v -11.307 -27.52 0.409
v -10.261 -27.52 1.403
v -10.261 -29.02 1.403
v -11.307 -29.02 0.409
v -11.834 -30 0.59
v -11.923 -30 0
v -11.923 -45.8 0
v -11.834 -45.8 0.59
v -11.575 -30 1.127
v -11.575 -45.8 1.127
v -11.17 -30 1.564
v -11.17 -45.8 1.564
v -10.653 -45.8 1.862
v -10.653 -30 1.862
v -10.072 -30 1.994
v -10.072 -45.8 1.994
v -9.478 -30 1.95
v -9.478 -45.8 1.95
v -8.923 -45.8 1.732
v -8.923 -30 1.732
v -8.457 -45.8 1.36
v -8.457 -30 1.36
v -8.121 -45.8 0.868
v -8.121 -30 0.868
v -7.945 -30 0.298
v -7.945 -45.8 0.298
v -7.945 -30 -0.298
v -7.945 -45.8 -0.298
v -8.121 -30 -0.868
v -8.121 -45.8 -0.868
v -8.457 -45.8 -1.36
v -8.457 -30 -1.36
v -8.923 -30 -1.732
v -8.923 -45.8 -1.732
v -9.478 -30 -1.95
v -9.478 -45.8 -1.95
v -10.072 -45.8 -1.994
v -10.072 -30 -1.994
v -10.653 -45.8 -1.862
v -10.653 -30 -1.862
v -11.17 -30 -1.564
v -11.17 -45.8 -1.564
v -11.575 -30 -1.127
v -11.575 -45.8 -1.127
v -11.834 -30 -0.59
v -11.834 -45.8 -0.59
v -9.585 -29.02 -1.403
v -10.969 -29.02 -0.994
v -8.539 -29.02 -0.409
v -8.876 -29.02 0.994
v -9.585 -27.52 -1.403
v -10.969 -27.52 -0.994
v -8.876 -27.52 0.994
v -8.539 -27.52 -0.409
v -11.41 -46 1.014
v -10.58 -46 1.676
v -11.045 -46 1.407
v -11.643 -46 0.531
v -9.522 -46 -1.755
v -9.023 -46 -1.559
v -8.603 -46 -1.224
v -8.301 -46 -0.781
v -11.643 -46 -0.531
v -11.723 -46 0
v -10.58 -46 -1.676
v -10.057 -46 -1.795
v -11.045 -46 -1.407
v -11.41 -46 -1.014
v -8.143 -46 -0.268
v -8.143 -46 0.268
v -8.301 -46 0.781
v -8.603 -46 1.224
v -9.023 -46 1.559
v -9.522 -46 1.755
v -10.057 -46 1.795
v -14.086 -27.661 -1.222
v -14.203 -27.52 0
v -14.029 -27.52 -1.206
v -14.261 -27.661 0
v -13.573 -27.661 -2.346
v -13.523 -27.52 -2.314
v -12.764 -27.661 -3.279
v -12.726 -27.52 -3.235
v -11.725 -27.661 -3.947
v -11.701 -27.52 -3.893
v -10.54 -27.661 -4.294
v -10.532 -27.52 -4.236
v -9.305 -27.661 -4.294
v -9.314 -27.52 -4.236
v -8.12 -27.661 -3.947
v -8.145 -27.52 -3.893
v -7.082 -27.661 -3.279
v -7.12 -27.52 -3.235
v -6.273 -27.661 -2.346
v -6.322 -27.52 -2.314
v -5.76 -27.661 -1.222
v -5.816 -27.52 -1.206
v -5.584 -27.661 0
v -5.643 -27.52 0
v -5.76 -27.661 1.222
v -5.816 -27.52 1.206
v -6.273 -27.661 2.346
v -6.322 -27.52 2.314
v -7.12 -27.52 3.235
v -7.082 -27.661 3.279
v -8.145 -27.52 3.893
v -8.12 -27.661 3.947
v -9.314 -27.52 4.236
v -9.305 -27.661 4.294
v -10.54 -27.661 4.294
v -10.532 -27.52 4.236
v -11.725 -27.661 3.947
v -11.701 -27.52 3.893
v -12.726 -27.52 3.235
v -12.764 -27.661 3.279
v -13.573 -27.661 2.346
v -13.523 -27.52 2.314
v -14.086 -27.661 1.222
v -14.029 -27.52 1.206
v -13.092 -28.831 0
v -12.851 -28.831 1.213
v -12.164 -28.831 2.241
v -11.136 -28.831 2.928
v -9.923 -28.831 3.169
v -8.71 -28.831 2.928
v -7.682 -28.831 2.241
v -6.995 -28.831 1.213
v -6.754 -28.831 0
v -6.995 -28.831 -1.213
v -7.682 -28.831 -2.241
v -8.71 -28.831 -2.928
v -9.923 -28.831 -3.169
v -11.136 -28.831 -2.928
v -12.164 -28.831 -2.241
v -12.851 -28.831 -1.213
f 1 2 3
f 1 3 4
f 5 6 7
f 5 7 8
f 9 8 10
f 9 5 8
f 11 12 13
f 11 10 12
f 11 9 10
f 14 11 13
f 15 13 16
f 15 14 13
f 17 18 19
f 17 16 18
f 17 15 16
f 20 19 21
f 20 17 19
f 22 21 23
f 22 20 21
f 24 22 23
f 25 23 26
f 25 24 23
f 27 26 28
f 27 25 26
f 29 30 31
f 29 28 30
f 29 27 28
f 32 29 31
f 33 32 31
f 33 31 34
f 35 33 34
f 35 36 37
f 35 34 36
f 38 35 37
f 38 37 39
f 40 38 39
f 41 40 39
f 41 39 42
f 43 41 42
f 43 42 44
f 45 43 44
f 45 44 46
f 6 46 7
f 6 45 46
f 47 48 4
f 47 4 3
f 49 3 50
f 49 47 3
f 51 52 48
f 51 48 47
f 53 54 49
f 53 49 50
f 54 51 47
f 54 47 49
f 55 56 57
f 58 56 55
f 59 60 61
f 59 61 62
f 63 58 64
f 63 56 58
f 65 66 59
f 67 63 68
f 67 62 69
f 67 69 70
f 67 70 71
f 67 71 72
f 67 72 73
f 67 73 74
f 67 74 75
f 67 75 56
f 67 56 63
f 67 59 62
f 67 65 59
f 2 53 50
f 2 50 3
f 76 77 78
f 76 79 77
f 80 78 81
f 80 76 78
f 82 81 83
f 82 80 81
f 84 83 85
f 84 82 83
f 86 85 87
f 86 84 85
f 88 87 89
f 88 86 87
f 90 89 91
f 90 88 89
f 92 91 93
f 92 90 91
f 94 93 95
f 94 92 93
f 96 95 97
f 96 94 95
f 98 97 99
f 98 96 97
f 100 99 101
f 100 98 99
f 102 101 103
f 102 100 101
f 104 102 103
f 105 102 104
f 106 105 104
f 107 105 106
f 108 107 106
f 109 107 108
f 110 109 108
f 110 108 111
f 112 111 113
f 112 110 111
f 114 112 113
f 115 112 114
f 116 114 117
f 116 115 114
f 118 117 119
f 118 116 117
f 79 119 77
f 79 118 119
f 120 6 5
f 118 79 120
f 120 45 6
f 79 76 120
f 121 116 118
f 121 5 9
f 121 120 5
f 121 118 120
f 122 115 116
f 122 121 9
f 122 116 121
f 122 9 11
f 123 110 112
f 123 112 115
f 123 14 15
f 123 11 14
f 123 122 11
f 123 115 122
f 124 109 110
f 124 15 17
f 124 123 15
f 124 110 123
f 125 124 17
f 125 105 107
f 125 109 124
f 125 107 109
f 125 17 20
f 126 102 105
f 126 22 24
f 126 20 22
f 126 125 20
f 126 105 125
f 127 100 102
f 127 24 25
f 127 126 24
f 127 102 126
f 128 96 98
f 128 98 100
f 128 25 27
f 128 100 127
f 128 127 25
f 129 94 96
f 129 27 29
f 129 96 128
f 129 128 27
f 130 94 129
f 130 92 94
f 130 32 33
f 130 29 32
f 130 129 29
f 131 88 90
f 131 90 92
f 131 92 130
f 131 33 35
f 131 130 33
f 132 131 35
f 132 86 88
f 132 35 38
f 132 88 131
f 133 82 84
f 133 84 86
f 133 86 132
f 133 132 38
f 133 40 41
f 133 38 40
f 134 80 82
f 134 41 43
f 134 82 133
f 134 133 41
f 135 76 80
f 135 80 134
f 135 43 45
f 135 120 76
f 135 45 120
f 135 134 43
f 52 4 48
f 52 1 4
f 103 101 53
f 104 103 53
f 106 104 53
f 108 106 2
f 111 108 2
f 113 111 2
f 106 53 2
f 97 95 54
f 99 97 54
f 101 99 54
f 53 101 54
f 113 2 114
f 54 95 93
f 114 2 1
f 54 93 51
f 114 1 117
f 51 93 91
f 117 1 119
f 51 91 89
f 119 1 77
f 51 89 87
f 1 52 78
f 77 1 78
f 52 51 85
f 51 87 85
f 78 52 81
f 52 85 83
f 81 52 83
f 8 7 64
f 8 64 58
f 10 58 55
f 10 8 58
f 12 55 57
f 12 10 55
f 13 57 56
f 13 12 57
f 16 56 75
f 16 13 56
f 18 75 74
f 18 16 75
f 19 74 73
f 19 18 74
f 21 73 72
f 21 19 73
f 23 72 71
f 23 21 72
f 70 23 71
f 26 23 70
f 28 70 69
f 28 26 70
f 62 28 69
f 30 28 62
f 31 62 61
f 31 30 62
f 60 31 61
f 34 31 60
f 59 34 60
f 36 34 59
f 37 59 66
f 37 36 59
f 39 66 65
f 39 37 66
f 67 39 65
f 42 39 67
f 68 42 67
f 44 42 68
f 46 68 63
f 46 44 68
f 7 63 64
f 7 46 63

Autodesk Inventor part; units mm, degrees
ref_plane "YZ Plane" through (0, 0, 0) normal (1, 0, 0) x (0, 1, 0)
ref_plane "XZ Plane" through (0, 0, 0) normal (0, 1, 0) x (-1, 0, 0)
ref_plane "XY Plane" through (0, 0, 0) normal (0, 0, 1) x (1, 0, 0)
sketch "Sketch1" plane through (0, 0, 0) normal (0, 0, 1) x (1, 0, 0)
  line L0 (-14.4028, -27.52) -> (-9.9228, -27.52)
  line L1 (-9.9228, -27.52) -> (-9.9228, -31)
  line L2 (-9.9228, -31) -> (-9.9228, -46)
  line L3 (-9.9228, -46) -> (-11.9228, -46)
  line L4 (-11.9228, -46) -> (-11.9228, -30)
  line L5 (-11.9228, -30) -> (-14.4028, -27.52)
  line L6 (-11.9228, -30) -> (-6.9228, -30) construction
  point P0 (0, 0)
  dimension "d3" = 2
  dimension "d15" = 2.48
  dimension "d16" = 4.48
  dimension "d24" = 90
  dimension "d25" = 16
revolve "Revolution1" add sketch "Sketch1" angle 360 about axis through (-9.9228, -31, 0) along (0, -1, 0)
chamfer "Chamfer2" distance 0.2 angle 45 1 edges at (-7.9228, -46, 0)
thread "Rosca1" size "M4x0.7" class "6g" standard "ANSI Metric M Profile" full length
chamfer "Chaflán3" distance 0.2 angle 45 1 edges at (-5.4428, -27.52, 0)
sketch "Boceto2" plane through (-9.9228, -27.52, 0) normal (0, 1, 0) x (1, 0, 0)
  line L0 (-1.0464, 0.9942) -> (0.3378, 1.4033)
  line L1 (0.3378, 1.4033) -> (1.3842, 0.4091)
  line L2 (1.3842, 0.4091) -> (1.0464, -0.9942)
  line L3 (1.0464, -0.9942) -> (-0.3378, -1.4033)
  line L4 (-0.3378, -1.4033) -> (-1.3842, -0.4091)
  line L5 (-1.3842, -0.4091) -> (-1.0464, 0.9942)
  point P0 (9.9228, 0)
  point P1 (0, 0)
  dimension "d20" = 2.5
extrude "Extrusión1" cut sketch "Boceto2" against normal blind 1.5
properties part number "Tornillo Allen cabeza fresada M4x16mm"
